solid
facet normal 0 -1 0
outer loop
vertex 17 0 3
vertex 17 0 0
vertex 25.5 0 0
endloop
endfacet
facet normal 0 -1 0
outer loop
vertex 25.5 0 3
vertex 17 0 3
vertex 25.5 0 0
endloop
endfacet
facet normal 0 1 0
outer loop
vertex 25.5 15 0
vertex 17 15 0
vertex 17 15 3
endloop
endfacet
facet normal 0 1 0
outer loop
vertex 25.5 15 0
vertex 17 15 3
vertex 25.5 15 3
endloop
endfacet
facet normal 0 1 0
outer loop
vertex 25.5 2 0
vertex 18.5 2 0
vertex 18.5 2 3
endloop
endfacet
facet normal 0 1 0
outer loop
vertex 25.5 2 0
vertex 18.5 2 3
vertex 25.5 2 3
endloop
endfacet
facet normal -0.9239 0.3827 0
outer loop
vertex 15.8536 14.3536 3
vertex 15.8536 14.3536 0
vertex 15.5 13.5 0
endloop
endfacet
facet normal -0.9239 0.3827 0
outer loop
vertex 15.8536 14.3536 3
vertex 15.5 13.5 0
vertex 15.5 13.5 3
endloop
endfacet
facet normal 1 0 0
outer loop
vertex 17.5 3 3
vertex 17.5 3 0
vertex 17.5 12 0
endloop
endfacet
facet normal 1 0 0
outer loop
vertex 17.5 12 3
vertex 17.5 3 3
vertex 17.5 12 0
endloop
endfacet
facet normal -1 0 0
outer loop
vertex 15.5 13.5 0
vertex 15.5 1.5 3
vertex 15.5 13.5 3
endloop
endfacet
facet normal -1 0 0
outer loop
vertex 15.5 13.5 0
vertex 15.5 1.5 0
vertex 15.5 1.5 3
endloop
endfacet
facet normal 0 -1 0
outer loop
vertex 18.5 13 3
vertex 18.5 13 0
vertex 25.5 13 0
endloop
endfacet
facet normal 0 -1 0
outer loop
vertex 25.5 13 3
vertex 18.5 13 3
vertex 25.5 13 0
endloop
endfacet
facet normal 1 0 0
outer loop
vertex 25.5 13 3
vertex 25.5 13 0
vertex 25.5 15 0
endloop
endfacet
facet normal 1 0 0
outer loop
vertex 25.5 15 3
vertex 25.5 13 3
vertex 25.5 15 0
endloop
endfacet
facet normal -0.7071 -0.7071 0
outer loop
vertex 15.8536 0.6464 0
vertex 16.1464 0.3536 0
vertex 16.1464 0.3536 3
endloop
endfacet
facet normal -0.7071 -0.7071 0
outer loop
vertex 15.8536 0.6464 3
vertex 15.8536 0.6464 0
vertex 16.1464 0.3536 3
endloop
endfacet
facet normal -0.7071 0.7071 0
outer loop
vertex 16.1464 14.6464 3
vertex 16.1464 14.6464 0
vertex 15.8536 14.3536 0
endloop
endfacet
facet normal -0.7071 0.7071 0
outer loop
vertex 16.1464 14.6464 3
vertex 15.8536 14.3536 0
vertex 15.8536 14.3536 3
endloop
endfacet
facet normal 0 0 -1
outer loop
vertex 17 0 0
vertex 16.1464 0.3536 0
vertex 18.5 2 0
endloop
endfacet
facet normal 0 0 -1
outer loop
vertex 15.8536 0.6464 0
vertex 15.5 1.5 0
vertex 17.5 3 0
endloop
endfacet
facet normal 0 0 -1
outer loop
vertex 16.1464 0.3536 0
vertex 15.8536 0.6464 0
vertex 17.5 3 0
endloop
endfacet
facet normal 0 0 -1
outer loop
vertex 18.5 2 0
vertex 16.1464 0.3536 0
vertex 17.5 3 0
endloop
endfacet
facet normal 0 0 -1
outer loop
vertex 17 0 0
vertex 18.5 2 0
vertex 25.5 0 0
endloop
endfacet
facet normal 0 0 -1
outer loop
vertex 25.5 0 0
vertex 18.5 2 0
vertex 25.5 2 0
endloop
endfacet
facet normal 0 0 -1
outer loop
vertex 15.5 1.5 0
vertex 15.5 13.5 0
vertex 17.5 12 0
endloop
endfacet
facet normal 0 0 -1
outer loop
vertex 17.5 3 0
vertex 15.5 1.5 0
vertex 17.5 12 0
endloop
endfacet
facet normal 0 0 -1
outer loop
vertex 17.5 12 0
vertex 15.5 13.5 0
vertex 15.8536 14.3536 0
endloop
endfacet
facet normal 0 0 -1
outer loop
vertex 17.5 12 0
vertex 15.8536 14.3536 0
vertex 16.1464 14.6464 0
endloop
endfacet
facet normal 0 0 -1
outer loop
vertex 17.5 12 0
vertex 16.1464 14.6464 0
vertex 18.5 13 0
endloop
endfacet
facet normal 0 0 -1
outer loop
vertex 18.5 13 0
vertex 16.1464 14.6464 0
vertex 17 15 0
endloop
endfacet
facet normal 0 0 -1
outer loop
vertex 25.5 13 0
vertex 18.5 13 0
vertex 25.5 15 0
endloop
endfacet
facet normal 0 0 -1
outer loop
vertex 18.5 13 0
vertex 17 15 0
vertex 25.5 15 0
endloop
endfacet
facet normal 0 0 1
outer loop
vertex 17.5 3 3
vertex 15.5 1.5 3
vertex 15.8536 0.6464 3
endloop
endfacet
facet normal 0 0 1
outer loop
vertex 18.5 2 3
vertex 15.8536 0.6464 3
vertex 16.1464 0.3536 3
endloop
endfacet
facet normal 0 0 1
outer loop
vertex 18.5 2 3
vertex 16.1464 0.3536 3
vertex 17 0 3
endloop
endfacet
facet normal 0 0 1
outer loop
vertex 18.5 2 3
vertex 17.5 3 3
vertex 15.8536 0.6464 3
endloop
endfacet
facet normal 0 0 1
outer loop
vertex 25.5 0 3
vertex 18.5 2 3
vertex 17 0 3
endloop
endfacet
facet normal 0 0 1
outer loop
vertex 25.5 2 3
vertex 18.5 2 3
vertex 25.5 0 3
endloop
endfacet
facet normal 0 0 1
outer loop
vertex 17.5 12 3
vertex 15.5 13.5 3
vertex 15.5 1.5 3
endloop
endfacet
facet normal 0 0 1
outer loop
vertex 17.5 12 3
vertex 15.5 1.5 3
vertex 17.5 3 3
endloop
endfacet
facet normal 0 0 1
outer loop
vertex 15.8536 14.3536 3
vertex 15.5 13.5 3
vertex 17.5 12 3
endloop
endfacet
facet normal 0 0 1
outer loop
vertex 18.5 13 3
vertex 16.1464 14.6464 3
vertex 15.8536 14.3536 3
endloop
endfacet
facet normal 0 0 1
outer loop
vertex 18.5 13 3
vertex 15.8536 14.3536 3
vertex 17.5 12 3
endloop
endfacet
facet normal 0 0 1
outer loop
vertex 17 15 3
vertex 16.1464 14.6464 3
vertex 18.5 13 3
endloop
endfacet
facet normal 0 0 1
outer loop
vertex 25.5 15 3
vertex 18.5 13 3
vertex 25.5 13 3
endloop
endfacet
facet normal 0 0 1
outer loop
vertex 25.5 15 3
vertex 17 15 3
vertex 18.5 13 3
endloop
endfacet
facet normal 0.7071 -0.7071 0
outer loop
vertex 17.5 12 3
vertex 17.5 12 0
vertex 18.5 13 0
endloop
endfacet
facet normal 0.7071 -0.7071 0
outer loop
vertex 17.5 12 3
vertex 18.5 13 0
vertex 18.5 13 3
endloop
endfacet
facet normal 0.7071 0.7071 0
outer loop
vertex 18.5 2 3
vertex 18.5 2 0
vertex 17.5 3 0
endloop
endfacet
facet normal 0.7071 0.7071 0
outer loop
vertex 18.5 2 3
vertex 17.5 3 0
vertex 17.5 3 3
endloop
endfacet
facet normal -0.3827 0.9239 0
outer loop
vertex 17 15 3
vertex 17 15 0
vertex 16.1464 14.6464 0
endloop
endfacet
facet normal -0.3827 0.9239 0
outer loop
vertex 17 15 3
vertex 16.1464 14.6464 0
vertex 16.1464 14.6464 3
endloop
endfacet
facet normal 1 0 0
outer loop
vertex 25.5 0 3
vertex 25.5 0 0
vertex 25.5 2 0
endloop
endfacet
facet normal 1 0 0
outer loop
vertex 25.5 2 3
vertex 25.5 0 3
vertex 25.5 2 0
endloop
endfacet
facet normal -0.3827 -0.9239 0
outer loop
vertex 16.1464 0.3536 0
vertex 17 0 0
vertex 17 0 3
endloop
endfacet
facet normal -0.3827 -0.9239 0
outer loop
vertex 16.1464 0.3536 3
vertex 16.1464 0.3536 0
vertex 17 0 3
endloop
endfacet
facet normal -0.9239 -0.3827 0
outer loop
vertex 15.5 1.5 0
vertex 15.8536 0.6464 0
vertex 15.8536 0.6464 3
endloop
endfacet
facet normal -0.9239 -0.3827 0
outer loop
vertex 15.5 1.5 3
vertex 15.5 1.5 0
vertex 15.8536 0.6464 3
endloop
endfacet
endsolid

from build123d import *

# Parameters (mm, degrees)
BOX003_W        = 10
BOX003_H        = 2
BOX003_DEPTH    = 3
BOX002_W        = 10
BOX002_H        = 2
BOX002_DEPTH    = 3
BOX004_W        = 2
BOX004_H        = 11
BOX004_DEPTH    = 3
CHAMFER002_SIZE = 1
CHAMFER003_SIZE = 0.5


with BuildPart() as cube003:
    # Box003 → Box003 (new body)
    with BuildSketch(Plane(origin=(15.5, 13, 0), x_dir=(1, 0, 0), z_dir=(0, 0, 1))):
        with Locations((5, 1)):
            Rectangle(BOX003_W, BOX003_H)
    extrude(amount=BOX003_DEPTH)


with BuildPart() as cube002:
    # Box002 → Box002 (new body)
    with BuildSketch(Plane(origin=(15.5, 0, 0), x_dir=(1, 0, 0), z_dir=(0, 0, 1))):
        with Locations((5, 1)):
            Rectangle(BOX002_W, BOX002_H)
    extrude(amount=BOX002_DEPTH)


with BuildPart() as chamfer003:
    # Box004 → Box004 (new body)
    with BuildSketch(Plane(origin=(15.5, 2, 0), x_dir=(1, 0, 0), z_dir=(0, 0, 1))):
        with Locations((1, 5.5)):
            Rectangle(BOX004_W, BOX004_H)
    extrude(amount=BOX004_DEPTH)

    # Fusion002: union Cube003, Cube002
    add(cube003.part)
    add(cube002.part)

    # Chamfer002
    chamfer002_edges = [chamfer003.edges().sort_by_distance(p)[0] for p in [
        (15.5, 0, 1.5),
        (15.5, 15, 1.5),
        (17.5, 2, 1.5),
        (17.5, 13, 1.5),
    ]]
    chamfer(chamfer002_edges, length=CHAMFER002_SIZE)

    # Chamfer003
    chamfer003_edges = [chamfer003.edges().sort_by_distance(p)[0] for p in [
        (15.5, 1, 1.5),
        (16.5, 0, 1.5),
        (15.5, 14, 1.5),
        (16.5, 15, 1.5),
    ]]
    chamfer(chamfer003_edges, length=CHAMFER003_SIZE)


solid = chamfer003.part
